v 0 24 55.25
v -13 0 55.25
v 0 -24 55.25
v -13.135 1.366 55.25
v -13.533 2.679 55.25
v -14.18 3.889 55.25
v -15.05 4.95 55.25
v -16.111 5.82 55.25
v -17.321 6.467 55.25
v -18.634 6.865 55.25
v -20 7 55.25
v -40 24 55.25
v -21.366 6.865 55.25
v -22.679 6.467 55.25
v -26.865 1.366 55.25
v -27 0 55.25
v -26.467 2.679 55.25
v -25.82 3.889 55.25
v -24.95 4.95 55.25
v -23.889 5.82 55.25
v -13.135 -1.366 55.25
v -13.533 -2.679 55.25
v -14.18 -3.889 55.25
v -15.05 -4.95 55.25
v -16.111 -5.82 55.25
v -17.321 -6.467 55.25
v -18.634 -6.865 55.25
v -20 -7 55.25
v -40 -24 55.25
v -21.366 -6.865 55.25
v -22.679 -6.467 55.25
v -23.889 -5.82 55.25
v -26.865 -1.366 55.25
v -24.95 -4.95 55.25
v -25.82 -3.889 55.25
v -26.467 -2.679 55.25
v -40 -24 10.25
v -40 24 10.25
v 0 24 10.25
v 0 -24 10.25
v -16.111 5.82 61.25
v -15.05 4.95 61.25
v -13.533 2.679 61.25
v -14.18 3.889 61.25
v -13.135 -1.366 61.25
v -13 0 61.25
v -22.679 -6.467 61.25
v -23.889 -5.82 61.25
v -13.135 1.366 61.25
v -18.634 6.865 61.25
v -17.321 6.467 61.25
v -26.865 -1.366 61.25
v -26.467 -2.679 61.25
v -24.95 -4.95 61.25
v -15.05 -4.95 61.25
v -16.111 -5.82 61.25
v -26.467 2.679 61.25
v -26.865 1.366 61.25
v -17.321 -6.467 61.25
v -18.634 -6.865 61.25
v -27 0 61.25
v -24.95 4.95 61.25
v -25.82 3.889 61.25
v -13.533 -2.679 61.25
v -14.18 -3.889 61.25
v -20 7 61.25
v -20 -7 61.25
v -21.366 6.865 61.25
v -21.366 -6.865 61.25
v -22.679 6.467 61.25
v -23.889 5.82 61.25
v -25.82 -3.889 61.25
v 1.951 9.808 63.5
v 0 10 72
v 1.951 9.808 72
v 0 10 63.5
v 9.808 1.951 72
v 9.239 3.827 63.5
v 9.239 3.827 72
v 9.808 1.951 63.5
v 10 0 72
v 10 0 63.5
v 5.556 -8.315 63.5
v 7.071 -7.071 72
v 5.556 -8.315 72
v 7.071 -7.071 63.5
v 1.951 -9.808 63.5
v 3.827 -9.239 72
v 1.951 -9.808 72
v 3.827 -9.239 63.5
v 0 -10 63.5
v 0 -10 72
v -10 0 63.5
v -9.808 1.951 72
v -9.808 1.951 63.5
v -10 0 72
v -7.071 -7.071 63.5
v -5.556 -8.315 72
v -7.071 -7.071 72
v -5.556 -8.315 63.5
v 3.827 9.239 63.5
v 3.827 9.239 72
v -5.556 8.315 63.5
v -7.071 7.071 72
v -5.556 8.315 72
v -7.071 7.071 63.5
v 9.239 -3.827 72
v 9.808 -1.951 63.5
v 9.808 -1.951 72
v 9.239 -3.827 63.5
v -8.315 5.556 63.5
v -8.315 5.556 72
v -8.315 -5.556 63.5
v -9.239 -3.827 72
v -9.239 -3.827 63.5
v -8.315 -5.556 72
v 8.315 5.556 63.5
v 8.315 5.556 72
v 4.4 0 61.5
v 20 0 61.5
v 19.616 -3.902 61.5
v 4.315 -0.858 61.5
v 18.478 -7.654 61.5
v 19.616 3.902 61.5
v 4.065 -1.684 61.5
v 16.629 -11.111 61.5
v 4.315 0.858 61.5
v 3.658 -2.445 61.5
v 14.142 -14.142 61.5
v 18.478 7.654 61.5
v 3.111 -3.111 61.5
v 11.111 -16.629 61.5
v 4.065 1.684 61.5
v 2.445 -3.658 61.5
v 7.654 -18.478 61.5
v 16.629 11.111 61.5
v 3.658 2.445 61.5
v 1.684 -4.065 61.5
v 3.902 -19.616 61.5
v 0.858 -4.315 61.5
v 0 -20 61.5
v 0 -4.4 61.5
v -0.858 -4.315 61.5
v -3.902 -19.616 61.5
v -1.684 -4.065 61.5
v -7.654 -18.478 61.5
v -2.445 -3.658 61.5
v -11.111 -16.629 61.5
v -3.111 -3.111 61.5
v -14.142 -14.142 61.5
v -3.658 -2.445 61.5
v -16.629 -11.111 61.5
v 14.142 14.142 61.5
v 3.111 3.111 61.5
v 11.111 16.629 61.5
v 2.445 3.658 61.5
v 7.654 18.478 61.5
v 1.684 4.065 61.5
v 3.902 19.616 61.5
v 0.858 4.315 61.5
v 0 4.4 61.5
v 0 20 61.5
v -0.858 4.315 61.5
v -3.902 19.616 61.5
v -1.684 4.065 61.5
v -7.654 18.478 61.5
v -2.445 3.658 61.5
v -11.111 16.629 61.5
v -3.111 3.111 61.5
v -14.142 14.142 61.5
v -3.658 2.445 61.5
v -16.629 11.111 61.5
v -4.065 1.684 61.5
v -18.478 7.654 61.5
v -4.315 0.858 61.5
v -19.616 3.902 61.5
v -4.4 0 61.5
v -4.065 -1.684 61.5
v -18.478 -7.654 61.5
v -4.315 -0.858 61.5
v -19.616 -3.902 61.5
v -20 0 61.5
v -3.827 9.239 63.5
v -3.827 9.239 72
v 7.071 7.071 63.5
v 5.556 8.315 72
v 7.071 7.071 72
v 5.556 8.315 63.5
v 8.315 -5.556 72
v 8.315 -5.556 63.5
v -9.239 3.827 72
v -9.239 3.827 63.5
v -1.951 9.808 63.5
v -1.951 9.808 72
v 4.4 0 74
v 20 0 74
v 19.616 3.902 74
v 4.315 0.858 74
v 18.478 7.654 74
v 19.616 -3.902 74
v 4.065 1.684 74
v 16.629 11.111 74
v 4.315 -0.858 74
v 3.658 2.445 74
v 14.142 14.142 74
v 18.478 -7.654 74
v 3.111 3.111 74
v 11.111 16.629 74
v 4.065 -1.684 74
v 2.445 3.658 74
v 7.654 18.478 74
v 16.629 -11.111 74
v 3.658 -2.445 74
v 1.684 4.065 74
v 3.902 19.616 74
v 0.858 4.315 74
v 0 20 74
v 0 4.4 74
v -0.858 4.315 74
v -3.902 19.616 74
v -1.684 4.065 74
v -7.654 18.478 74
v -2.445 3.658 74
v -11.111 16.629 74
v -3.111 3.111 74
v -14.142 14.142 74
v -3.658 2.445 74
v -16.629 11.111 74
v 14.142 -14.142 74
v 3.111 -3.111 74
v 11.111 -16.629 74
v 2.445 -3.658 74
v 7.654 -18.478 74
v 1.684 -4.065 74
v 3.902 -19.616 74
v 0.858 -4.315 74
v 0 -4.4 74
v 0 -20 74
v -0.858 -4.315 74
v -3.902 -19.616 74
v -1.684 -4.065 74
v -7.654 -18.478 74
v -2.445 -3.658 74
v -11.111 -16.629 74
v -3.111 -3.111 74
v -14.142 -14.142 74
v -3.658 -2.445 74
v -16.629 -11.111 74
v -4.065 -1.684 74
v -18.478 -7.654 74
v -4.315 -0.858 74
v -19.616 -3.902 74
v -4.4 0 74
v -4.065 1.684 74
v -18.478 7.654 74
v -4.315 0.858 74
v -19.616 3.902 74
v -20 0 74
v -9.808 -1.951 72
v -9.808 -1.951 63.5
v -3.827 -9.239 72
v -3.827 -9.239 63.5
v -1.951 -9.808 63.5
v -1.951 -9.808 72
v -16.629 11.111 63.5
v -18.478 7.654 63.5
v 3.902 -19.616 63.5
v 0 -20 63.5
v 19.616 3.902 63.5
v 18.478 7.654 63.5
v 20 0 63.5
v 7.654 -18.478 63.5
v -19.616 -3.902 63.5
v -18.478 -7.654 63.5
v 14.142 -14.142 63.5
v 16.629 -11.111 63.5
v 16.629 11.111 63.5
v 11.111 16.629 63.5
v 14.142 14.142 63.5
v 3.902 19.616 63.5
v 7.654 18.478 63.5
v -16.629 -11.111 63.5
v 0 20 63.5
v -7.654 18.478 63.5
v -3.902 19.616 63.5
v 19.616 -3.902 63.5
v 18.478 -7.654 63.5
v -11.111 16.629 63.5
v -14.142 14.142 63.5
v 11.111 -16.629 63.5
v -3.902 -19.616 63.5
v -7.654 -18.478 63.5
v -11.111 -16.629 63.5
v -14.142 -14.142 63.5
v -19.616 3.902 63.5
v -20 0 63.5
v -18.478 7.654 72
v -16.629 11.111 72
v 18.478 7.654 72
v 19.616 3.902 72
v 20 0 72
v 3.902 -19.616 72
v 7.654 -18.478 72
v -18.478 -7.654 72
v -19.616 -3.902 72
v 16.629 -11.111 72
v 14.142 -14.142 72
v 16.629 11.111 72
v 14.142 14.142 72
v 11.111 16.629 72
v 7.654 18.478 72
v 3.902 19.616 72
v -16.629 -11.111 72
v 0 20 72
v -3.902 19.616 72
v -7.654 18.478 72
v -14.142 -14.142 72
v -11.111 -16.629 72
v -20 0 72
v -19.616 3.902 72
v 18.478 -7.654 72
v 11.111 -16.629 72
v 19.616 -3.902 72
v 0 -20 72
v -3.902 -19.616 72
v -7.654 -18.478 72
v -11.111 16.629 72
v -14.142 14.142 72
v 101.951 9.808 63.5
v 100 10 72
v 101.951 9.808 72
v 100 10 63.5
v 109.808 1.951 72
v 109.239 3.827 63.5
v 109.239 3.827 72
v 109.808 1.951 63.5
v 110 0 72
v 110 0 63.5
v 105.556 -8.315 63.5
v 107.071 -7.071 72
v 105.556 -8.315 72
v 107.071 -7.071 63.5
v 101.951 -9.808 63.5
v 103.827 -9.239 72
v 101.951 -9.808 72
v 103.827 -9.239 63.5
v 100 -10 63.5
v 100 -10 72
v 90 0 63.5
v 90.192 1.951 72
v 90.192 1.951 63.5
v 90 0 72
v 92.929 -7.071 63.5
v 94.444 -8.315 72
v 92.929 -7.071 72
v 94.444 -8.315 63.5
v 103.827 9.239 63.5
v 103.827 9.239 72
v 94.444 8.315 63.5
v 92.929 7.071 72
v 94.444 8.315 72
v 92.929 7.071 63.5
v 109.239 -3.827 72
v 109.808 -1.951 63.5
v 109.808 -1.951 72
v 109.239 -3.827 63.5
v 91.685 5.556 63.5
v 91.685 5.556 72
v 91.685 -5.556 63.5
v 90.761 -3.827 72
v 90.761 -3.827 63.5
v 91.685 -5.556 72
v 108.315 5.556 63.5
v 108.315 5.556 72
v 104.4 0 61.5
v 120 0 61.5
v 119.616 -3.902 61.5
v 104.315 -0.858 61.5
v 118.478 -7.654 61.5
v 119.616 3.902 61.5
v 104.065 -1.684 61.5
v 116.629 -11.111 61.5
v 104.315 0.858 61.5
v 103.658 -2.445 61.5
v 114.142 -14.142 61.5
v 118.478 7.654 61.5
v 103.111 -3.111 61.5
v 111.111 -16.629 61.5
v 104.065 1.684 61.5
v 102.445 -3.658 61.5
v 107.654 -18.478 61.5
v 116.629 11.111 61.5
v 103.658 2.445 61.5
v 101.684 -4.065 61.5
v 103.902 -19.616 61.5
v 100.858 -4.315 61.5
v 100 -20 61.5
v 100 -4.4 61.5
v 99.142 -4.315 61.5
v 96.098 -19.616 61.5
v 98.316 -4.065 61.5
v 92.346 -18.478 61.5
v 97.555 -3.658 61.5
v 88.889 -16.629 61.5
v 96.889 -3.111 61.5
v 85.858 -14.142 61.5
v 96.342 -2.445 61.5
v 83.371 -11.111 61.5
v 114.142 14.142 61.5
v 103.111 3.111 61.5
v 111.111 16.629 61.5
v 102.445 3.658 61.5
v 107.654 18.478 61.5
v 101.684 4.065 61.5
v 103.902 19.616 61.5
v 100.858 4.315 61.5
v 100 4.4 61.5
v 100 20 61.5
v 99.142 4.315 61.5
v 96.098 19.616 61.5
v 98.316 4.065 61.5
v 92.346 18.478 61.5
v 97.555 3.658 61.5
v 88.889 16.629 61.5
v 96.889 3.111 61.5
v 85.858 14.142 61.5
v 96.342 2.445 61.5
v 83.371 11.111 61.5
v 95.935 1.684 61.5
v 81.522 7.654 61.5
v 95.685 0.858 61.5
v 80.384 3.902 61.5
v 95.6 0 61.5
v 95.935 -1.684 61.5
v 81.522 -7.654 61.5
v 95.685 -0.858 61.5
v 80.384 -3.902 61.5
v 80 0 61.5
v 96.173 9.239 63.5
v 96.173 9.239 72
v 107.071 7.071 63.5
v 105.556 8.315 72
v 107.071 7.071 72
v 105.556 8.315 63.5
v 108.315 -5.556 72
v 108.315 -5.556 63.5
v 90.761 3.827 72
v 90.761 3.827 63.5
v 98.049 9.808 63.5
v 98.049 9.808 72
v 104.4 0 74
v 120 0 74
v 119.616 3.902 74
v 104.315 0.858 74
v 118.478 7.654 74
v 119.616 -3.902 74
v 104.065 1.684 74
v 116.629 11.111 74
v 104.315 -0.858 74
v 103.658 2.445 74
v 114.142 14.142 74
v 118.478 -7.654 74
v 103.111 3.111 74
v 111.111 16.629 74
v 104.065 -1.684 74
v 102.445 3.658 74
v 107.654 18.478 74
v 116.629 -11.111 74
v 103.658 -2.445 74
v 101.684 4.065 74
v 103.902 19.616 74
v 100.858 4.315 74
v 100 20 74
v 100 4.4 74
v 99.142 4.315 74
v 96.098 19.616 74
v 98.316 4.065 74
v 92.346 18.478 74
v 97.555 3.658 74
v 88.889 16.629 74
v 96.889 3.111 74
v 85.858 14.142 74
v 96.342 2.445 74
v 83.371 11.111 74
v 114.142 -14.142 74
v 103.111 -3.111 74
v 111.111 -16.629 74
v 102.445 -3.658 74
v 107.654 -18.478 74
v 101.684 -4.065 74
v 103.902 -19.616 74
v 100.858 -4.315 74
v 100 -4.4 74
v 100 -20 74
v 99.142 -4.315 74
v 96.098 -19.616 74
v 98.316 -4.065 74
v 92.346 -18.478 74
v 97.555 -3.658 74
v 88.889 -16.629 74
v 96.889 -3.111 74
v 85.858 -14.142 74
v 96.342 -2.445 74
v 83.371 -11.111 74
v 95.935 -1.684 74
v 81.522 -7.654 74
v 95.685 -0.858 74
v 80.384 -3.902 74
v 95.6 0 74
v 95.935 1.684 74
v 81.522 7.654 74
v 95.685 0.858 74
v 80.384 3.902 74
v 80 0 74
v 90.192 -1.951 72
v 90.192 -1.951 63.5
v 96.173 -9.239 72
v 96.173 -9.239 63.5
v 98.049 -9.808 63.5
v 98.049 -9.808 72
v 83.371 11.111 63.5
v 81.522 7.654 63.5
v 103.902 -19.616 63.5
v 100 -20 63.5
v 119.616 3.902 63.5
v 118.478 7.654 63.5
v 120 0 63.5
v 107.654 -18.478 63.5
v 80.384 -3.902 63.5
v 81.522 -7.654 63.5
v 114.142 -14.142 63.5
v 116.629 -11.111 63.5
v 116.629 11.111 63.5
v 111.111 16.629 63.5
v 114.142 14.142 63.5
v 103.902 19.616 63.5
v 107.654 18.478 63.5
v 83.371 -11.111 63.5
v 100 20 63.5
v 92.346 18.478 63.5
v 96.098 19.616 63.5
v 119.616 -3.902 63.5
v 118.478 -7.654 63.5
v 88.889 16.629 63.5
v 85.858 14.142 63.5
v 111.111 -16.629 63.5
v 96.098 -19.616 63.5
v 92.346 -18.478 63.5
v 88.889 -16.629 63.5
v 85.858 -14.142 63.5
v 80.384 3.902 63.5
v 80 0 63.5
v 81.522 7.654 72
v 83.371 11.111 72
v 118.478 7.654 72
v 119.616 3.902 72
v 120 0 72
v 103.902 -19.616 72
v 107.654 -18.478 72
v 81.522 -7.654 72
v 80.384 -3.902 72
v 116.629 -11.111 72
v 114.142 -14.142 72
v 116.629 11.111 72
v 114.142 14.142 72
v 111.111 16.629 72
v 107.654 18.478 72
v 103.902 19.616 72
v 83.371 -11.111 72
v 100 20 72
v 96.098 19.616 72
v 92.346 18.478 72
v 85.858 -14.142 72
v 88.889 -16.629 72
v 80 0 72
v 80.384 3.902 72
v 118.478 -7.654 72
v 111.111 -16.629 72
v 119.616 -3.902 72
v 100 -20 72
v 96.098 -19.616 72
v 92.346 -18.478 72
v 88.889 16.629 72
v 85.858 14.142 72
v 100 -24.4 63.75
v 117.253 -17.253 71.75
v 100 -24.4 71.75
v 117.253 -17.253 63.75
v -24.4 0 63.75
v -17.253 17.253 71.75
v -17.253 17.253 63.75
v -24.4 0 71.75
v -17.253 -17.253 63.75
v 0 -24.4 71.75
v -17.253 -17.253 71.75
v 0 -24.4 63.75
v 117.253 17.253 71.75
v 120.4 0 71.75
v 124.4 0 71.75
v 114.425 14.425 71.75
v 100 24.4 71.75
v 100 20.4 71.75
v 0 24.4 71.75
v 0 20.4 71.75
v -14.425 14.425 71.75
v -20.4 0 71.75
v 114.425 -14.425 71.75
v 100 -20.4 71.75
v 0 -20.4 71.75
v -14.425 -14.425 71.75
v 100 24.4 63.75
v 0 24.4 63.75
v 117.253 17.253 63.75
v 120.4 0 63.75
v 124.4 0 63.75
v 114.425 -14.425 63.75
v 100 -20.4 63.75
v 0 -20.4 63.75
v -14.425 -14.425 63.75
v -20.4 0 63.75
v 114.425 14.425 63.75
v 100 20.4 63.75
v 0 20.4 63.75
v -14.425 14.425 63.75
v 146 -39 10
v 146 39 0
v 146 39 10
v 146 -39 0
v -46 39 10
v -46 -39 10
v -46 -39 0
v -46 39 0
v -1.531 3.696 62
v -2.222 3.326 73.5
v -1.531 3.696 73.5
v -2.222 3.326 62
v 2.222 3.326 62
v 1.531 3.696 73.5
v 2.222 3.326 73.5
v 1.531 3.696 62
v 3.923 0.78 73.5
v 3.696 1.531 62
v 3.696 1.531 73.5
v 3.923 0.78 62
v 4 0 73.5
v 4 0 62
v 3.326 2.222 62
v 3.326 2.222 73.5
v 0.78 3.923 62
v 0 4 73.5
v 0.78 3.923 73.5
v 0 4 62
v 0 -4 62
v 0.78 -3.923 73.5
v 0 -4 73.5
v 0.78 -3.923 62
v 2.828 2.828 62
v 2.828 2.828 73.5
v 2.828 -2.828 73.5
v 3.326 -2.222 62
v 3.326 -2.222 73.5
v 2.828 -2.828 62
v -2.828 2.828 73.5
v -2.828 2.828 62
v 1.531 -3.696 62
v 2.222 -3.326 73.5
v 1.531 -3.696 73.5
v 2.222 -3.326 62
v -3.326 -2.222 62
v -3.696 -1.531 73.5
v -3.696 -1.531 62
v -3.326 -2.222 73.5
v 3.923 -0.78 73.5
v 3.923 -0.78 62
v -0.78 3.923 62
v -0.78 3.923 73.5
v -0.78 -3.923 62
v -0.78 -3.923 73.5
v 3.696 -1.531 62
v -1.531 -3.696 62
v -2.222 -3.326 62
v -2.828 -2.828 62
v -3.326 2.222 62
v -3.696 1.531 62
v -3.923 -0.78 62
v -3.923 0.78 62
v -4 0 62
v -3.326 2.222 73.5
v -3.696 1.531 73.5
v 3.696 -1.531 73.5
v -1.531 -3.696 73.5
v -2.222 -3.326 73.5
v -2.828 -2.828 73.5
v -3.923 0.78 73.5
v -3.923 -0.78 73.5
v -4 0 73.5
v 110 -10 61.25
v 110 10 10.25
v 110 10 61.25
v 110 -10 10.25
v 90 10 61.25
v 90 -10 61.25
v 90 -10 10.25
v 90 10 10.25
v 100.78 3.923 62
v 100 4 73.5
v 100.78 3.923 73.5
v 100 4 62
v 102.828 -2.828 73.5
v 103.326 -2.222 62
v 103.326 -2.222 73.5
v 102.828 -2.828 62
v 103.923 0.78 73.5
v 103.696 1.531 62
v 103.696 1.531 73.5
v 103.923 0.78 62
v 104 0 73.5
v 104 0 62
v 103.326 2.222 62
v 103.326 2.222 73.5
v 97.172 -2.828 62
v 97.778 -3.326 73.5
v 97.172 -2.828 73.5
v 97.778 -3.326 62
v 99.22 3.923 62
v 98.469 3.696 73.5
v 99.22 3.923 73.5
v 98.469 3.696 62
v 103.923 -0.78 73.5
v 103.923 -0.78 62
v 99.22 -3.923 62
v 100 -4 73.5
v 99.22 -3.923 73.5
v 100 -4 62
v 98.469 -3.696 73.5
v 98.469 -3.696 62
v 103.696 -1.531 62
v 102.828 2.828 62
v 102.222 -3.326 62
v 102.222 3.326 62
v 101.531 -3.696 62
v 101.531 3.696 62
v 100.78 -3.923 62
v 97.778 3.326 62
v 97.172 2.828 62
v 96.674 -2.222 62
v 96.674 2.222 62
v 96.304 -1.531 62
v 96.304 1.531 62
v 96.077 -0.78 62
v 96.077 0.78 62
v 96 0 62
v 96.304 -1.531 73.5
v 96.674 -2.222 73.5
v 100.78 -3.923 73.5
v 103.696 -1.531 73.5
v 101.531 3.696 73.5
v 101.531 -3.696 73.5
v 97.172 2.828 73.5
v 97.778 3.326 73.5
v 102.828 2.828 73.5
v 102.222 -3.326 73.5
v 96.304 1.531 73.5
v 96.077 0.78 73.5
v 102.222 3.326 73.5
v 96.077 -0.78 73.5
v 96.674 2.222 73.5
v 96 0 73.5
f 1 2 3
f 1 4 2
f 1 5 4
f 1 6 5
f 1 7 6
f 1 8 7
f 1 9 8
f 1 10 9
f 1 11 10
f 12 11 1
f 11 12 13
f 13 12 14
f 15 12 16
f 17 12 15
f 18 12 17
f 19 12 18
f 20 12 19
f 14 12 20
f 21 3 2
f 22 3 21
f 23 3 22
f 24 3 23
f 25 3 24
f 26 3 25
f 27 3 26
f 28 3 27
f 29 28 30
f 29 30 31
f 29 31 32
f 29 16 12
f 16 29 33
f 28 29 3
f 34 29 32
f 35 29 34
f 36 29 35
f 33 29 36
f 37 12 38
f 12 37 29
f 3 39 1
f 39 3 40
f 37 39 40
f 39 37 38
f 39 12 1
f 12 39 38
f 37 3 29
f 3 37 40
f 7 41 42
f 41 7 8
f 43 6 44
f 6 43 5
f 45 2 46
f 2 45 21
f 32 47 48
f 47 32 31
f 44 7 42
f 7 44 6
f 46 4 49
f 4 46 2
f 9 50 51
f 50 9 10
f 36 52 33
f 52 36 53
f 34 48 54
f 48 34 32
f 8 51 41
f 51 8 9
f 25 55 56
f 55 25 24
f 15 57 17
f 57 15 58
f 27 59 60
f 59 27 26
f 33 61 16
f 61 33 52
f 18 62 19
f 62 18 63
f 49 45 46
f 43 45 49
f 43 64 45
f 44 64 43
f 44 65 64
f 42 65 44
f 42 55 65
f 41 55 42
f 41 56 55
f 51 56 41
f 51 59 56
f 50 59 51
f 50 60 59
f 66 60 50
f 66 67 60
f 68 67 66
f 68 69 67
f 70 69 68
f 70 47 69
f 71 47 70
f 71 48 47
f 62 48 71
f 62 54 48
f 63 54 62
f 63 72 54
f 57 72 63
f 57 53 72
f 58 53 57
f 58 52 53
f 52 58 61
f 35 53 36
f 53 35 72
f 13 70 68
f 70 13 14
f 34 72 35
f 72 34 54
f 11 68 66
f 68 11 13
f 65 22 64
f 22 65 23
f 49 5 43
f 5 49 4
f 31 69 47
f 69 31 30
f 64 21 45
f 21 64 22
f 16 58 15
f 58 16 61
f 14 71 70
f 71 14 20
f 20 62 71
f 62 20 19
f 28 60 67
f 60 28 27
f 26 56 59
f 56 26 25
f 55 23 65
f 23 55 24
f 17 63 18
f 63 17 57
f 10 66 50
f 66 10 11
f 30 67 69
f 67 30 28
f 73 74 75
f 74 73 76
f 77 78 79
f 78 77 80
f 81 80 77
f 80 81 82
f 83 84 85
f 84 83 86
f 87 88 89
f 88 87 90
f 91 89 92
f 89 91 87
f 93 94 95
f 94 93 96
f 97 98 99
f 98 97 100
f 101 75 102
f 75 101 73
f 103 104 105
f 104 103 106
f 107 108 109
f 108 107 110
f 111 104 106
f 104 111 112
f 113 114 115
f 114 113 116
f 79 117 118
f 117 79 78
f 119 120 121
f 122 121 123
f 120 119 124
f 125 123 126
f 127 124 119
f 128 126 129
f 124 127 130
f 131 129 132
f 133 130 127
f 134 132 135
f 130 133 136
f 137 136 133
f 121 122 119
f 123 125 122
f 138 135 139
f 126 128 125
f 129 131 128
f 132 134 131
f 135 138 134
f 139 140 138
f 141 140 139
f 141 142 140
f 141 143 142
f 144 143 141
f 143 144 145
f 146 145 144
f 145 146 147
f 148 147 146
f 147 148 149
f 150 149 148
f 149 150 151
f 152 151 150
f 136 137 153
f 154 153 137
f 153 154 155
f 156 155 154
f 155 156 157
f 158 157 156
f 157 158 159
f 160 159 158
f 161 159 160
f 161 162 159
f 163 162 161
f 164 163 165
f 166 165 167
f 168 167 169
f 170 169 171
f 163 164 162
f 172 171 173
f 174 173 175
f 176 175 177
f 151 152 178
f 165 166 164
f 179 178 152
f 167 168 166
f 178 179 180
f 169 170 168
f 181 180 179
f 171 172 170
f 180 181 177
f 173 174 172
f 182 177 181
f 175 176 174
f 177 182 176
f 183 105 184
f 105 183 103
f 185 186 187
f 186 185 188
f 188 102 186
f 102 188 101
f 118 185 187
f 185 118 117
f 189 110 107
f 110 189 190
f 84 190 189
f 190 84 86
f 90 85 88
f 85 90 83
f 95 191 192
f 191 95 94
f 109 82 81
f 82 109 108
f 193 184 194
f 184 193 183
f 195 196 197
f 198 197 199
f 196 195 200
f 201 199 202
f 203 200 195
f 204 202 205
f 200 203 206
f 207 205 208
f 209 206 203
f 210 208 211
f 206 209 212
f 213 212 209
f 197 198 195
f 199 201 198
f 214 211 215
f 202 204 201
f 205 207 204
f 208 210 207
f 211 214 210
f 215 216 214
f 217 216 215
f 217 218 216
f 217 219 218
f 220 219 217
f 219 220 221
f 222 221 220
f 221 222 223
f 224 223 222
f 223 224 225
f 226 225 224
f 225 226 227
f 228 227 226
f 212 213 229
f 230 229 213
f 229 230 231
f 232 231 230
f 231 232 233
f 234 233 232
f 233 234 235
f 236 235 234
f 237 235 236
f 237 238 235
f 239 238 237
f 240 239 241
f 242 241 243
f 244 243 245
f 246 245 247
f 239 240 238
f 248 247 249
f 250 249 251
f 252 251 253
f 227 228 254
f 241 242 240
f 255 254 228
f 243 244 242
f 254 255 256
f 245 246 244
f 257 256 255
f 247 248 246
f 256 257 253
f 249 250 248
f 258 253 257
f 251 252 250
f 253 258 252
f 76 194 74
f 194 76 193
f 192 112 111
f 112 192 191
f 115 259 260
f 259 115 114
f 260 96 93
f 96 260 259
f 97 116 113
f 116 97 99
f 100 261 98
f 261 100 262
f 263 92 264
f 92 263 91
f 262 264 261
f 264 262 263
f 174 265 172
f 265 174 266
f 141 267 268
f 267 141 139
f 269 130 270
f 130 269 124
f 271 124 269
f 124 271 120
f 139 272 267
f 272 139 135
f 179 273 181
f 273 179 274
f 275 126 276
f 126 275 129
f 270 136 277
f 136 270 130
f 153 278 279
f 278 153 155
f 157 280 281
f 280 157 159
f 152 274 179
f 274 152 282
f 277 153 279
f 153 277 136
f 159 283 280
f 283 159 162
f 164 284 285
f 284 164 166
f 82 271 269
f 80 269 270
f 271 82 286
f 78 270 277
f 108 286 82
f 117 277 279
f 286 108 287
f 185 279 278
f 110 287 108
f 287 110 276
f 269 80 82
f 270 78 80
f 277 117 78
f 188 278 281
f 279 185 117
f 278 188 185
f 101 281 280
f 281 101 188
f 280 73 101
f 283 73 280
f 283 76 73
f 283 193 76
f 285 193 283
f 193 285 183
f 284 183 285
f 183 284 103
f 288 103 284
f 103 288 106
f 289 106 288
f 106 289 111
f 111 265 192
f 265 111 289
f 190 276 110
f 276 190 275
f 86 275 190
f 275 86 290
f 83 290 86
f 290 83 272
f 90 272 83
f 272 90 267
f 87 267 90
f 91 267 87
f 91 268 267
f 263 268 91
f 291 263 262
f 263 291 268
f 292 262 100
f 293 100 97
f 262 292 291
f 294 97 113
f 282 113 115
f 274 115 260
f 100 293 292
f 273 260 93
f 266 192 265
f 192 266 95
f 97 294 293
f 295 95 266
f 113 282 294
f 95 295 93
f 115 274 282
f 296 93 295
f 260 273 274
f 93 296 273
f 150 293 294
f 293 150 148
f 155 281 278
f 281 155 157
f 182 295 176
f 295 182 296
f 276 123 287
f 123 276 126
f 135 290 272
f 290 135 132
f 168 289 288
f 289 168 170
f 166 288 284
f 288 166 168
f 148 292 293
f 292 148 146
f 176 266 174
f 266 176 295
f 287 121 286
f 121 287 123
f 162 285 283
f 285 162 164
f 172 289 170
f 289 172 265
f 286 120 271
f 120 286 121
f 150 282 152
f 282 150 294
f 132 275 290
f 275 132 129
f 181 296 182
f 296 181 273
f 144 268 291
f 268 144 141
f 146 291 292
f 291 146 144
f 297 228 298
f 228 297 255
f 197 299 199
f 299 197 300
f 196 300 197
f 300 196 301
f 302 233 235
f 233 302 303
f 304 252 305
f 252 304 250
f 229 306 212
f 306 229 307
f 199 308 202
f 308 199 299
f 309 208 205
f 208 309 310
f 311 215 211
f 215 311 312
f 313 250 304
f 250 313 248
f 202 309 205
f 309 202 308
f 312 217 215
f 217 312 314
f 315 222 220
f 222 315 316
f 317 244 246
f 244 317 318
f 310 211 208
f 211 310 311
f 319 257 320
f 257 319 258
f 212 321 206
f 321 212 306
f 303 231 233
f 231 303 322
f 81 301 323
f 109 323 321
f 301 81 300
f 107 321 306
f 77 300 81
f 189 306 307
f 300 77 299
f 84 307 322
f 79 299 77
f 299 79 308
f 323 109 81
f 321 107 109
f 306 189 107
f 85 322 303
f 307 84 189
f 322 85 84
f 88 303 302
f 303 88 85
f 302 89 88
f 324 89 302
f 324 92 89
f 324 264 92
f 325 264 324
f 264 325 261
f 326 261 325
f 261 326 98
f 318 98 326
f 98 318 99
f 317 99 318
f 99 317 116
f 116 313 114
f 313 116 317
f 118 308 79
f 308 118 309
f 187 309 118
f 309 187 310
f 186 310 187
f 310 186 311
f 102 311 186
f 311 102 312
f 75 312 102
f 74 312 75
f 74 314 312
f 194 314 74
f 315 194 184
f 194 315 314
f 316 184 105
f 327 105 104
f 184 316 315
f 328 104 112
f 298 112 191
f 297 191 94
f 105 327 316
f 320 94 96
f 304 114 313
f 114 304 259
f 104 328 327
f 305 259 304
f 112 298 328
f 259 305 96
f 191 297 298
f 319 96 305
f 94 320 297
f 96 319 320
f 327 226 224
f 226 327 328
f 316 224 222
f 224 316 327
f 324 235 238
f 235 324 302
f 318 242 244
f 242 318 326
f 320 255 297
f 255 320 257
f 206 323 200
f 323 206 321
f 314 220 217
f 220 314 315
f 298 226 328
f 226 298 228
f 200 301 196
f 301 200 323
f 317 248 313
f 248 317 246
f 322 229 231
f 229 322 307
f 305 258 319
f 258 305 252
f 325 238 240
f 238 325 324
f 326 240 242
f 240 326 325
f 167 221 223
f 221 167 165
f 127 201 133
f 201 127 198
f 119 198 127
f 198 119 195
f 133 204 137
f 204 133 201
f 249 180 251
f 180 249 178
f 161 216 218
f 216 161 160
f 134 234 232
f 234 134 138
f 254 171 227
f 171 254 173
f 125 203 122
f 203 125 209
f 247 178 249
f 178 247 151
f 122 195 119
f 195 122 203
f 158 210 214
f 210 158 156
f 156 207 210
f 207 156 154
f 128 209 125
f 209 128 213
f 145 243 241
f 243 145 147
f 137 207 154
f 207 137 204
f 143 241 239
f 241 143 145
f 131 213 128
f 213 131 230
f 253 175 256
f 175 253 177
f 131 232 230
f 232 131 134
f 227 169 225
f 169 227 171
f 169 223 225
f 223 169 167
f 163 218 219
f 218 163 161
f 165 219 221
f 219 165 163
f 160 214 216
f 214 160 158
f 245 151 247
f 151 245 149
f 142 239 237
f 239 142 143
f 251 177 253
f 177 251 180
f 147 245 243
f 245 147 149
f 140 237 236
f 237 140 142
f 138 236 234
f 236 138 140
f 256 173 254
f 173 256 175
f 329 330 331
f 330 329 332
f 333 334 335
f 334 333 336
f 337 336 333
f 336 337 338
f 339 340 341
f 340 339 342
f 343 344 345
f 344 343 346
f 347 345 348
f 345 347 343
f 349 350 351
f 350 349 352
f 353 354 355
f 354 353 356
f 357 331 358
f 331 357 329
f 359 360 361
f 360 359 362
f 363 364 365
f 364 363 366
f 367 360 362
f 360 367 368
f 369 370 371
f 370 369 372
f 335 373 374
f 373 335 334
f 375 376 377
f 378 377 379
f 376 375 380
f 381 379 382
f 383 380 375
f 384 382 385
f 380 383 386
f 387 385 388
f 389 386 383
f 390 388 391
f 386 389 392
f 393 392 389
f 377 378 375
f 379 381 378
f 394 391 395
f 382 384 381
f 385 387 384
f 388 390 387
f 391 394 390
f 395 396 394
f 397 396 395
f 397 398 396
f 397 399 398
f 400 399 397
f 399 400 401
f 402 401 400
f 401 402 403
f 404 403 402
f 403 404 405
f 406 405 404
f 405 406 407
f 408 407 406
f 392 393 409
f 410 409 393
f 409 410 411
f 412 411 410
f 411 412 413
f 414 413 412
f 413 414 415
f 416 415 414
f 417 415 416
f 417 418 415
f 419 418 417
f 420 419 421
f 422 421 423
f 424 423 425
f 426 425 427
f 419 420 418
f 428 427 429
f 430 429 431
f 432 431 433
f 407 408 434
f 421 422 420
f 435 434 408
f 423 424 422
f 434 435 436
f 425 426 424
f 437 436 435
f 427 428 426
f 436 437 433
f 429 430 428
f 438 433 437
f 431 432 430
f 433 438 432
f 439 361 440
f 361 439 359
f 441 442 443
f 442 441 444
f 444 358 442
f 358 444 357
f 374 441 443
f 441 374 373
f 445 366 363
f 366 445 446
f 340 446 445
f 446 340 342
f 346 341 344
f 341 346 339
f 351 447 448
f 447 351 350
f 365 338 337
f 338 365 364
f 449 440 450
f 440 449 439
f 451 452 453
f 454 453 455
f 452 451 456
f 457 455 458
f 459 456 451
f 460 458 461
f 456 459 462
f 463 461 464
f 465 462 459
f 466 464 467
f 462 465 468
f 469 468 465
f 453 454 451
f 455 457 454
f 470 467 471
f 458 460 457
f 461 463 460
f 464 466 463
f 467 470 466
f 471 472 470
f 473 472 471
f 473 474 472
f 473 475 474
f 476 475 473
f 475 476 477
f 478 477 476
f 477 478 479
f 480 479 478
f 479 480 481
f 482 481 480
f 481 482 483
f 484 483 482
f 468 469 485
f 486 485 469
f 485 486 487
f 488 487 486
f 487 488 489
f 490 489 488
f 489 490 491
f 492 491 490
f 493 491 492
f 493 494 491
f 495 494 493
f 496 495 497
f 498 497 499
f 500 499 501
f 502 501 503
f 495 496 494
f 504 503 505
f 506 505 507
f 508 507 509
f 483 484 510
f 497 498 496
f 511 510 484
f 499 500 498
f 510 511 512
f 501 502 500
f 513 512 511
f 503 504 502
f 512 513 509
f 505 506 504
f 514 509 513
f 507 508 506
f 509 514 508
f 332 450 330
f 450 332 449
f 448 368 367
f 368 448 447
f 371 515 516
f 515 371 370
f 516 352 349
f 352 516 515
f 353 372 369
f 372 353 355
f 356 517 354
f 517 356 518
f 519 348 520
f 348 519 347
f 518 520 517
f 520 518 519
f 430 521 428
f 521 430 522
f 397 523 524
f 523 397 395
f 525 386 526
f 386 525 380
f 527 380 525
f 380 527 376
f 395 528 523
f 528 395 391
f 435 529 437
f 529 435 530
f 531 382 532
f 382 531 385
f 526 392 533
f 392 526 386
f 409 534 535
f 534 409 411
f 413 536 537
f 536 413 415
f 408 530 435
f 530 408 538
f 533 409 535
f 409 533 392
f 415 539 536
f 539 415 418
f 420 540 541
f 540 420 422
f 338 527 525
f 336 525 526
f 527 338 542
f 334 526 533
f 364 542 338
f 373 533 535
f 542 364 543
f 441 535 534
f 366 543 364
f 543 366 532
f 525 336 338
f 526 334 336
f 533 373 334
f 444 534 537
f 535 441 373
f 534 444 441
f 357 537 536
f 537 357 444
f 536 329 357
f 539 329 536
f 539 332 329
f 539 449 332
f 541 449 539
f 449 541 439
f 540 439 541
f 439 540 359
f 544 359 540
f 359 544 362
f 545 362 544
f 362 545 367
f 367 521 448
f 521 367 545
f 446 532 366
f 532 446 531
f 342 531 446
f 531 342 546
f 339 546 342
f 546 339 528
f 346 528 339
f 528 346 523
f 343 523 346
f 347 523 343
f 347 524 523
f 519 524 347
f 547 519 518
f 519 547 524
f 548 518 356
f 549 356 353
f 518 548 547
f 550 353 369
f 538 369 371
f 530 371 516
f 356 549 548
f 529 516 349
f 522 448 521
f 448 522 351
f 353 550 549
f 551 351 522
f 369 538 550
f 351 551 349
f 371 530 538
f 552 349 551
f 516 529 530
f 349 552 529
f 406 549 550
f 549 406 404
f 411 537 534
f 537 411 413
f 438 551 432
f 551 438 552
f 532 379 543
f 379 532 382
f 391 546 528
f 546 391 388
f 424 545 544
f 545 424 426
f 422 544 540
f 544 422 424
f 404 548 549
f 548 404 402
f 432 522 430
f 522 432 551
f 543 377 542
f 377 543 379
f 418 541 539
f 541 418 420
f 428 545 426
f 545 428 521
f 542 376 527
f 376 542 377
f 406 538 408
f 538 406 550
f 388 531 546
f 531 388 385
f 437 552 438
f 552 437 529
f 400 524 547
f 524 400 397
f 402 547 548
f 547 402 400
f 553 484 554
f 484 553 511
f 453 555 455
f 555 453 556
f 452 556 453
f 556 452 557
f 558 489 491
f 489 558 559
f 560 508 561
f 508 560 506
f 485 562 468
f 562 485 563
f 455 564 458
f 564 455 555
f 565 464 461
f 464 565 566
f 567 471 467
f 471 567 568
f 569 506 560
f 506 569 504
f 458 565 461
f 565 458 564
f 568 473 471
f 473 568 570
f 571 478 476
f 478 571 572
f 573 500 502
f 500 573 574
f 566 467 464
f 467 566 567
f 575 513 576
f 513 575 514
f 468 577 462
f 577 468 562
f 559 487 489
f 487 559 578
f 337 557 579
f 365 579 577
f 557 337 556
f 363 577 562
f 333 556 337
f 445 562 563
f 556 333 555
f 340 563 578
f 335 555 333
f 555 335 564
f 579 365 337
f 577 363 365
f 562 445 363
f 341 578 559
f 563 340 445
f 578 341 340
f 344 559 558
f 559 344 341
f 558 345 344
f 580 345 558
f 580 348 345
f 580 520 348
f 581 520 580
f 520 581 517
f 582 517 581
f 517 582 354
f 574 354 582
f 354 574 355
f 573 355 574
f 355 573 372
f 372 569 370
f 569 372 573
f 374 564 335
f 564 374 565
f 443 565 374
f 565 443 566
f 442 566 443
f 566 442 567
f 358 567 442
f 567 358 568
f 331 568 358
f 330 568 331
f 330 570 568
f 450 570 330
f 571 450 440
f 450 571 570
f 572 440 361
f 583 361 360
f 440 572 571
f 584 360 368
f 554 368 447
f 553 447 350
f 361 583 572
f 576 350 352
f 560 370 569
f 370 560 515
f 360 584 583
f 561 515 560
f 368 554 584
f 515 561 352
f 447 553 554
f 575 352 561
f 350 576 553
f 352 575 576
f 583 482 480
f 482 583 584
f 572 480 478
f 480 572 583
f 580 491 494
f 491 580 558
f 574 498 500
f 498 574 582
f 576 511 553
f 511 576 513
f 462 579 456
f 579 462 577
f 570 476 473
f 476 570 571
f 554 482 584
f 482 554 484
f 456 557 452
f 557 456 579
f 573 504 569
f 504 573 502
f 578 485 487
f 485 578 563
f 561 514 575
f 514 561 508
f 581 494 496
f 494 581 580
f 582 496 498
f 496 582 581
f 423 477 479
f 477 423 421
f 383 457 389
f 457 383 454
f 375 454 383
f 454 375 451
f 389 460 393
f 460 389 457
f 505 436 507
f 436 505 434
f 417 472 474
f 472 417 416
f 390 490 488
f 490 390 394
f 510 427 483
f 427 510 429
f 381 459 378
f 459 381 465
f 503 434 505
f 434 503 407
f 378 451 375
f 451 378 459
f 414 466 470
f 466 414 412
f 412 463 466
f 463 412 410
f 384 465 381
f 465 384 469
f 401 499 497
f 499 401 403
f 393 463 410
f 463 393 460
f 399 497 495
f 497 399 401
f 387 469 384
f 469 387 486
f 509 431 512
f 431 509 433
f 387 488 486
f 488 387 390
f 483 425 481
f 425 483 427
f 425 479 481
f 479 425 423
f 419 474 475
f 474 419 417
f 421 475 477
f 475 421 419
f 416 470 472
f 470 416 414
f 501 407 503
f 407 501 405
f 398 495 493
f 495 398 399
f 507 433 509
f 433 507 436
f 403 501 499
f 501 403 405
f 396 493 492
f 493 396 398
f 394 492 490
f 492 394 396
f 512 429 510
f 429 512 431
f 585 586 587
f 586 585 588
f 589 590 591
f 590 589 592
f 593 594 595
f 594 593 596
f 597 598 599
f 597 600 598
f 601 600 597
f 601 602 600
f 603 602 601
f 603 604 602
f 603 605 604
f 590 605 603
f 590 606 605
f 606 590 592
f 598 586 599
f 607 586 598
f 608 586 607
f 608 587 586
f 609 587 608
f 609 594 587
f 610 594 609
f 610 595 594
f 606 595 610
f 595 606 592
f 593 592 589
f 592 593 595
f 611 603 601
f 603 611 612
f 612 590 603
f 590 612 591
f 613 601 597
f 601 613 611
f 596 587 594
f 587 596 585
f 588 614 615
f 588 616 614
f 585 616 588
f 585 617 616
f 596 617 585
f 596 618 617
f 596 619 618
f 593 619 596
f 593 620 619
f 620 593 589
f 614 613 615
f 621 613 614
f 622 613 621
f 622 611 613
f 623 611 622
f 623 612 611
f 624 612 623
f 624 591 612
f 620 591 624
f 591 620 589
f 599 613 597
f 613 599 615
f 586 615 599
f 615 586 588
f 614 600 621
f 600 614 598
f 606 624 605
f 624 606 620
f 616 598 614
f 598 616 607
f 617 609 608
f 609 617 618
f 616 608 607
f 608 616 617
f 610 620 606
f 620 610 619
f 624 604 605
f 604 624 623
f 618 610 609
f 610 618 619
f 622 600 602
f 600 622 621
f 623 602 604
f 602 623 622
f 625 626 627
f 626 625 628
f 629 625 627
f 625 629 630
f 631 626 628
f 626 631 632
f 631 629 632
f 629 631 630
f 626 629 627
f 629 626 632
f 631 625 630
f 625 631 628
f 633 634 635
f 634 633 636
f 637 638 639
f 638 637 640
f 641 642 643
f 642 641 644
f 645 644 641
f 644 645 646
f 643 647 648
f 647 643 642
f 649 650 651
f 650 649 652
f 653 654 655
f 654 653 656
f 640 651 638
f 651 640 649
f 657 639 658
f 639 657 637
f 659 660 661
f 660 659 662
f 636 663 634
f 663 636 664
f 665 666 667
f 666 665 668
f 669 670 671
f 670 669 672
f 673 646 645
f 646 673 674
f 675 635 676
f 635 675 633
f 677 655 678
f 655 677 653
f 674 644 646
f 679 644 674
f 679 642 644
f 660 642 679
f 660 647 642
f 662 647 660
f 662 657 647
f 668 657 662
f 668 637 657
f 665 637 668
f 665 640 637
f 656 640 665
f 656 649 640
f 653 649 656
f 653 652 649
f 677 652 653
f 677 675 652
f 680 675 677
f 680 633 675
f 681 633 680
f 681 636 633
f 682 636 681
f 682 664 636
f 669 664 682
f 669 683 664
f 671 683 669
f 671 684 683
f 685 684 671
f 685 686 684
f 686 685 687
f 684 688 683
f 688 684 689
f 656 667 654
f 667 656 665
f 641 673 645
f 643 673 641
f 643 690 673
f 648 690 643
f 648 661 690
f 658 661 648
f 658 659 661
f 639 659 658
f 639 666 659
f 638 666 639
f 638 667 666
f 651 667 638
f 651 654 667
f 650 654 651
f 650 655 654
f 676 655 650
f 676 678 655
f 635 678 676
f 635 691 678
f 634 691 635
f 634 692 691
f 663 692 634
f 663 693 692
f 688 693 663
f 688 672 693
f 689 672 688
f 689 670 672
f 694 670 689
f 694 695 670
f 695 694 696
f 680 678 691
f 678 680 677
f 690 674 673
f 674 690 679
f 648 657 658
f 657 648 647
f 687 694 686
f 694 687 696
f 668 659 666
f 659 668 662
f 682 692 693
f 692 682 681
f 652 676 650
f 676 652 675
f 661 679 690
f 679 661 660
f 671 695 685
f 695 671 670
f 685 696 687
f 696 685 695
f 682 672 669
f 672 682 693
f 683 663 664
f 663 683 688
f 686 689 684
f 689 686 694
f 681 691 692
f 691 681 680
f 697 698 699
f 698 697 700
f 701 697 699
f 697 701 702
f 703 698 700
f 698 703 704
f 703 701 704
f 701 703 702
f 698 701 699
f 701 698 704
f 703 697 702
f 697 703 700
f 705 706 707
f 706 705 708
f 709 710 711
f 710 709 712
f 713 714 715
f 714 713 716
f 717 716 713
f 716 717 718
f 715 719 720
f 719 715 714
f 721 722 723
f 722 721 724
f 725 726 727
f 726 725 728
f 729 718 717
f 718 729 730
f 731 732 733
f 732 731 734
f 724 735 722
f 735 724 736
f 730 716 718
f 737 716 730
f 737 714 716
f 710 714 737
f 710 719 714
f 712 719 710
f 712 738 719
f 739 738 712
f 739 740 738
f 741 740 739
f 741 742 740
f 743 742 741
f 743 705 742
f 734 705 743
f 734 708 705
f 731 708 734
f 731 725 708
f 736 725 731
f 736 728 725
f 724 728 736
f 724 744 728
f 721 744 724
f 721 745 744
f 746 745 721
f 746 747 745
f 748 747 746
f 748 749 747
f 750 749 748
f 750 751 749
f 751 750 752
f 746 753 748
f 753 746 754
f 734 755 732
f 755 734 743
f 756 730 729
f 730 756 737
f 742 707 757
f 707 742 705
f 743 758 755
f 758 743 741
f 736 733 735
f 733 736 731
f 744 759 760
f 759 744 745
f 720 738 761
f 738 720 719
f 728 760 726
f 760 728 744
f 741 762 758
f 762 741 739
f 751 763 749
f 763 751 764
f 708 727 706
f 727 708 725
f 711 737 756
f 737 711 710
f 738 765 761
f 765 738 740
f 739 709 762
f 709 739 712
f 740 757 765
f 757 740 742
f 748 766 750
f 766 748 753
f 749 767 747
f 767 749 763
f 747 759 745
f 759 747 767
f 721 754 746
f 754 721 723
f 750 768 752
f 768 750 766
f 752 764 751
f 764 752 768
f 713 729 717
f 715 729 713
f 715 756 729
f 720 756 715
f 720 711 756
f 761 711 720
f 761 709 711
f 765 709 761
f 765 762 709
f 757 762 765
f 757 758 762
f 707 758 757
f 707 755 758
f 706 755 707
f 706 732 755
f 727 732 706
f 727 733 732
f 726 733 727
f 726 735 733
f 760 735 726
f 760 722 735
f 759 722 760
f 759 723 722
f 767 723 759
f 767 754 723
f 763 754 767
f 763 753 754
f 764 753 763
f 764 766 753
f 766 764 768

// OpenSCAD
$fn = 32;

// ------------------------------------------------------------------------
// Motor belt drive: span 100 mm, pulleys d40, belt 8 mm wide
// Every part is its own module, assembly() places every instance.
// ------------------------------------------------------------------------

// --- part 1 ---
module base_plate() {
  difference() {
    translate([-96, -39, 0]) cube([192, 78, 10]);
  }
}

// --- part 2 ---
module motor() {
  union() {
    translate([-22.5, -24, 0]) cube([45, 48, 40]);
    translate([25.5, 0, 20]) rotate([0, 90, 0]) cylinder(h = 6, d = 14, center = true);
  }
}

// --- part 3 ---
module drive_shaft() {
  translate([0, 0, -5.75]) cylinder(h = 11.5, d = 8);
}

// --- part 4 ---
module pulley_drive() {
  difference() {
    union() {
      cylinder(h = 12.5, d = 20);
      cylinder(h = 2, d = 40);
      translate([0, 0, 10.5]) cylinder(h = 2, d = 40);
    }
    translate([0, 0, -1]) cylinder(h = 14.5, d = 8.8);
  }
}

// --- part 5 ---
module idler_post() {
  translate([-10, -10, 0]) cube([20, 20, 51]);
}

// --- part 6 ---
module driven_shaft() {
  translate([0, 0, -5.75]) cylinder(h = 11.5, d = 8);
}

// --- part 7 ---
module pulley_driven() {
  difference() {
    union() {
      cylinder(h = 12.5, d = 20);
      cylinder(h = 2, d = 40);
      translate([0, 0, 10.5]) cylinder(h = 2, d = 40);
    }
    translate([0, 0, -1]) cylinder(h = 14.5, d = 8.8);
  }
}

// --- part 8 ---
module drive_belt() {
  difference() {
    linear_extrude(height = 8) polygon(points = concat([for (a = [90 : 45 : 270]) [24.4 * cos(a), 24.4 * sin(a)]], [for (a = [270 : 45 : 450]) [100 + 24.4 * cos(a), 24.4 * sin(a)]]));
    translate([0, 0, -1]) linear_extrude(height = 10) polygon(points = concat([for (a = [90 : 45 : 270]) [20.4 * cos(a), 20.4 * sin(a)]], [for (a = [270 : 45 : 450]) [100 + 20.4 * cos(a), 20.4 * sin(a)]]));
  }
}

// --- assembly ---
module assembly() {
  color([0.80, 0.24, 0.20]) translate([50, 0, 0]) rotate([0, 0, 0]) base_plate();
  color([0.20, 0.45, 0.75]) translate([0, 0, 32.75]) rotate([0, 270, 0]) motor();
  color([0.25, 0.62, 0.32]) translate([0, 0, 67.75]) rotate([0, 0, 0]) drive_shaft();
  color([0.92, 0.70, 0.18]) translate([0, 0, 61.5]) rotate([0, 0, 0]) pulley_drive();
  color([0.58, 0.35, 0.70]) translate([100, 0, 10.25]) rotate([0, 0, 0]) idler_post();
  color([0.16, 0.66, 0.66]) translate([100, 0, 67.75]) rotate([0, 0, 0]) driven_shaft();
  color([0.85, 0.48, 0.18]) translate([100, 0, 61.5]) rotate([0, 0, 0]) pulley_driven();
  color([0.55, 0.60, 0.65]) translate([0, 0, 63.75]) rotate([0, 0, 0]) drive_belt();
}

assembly();
